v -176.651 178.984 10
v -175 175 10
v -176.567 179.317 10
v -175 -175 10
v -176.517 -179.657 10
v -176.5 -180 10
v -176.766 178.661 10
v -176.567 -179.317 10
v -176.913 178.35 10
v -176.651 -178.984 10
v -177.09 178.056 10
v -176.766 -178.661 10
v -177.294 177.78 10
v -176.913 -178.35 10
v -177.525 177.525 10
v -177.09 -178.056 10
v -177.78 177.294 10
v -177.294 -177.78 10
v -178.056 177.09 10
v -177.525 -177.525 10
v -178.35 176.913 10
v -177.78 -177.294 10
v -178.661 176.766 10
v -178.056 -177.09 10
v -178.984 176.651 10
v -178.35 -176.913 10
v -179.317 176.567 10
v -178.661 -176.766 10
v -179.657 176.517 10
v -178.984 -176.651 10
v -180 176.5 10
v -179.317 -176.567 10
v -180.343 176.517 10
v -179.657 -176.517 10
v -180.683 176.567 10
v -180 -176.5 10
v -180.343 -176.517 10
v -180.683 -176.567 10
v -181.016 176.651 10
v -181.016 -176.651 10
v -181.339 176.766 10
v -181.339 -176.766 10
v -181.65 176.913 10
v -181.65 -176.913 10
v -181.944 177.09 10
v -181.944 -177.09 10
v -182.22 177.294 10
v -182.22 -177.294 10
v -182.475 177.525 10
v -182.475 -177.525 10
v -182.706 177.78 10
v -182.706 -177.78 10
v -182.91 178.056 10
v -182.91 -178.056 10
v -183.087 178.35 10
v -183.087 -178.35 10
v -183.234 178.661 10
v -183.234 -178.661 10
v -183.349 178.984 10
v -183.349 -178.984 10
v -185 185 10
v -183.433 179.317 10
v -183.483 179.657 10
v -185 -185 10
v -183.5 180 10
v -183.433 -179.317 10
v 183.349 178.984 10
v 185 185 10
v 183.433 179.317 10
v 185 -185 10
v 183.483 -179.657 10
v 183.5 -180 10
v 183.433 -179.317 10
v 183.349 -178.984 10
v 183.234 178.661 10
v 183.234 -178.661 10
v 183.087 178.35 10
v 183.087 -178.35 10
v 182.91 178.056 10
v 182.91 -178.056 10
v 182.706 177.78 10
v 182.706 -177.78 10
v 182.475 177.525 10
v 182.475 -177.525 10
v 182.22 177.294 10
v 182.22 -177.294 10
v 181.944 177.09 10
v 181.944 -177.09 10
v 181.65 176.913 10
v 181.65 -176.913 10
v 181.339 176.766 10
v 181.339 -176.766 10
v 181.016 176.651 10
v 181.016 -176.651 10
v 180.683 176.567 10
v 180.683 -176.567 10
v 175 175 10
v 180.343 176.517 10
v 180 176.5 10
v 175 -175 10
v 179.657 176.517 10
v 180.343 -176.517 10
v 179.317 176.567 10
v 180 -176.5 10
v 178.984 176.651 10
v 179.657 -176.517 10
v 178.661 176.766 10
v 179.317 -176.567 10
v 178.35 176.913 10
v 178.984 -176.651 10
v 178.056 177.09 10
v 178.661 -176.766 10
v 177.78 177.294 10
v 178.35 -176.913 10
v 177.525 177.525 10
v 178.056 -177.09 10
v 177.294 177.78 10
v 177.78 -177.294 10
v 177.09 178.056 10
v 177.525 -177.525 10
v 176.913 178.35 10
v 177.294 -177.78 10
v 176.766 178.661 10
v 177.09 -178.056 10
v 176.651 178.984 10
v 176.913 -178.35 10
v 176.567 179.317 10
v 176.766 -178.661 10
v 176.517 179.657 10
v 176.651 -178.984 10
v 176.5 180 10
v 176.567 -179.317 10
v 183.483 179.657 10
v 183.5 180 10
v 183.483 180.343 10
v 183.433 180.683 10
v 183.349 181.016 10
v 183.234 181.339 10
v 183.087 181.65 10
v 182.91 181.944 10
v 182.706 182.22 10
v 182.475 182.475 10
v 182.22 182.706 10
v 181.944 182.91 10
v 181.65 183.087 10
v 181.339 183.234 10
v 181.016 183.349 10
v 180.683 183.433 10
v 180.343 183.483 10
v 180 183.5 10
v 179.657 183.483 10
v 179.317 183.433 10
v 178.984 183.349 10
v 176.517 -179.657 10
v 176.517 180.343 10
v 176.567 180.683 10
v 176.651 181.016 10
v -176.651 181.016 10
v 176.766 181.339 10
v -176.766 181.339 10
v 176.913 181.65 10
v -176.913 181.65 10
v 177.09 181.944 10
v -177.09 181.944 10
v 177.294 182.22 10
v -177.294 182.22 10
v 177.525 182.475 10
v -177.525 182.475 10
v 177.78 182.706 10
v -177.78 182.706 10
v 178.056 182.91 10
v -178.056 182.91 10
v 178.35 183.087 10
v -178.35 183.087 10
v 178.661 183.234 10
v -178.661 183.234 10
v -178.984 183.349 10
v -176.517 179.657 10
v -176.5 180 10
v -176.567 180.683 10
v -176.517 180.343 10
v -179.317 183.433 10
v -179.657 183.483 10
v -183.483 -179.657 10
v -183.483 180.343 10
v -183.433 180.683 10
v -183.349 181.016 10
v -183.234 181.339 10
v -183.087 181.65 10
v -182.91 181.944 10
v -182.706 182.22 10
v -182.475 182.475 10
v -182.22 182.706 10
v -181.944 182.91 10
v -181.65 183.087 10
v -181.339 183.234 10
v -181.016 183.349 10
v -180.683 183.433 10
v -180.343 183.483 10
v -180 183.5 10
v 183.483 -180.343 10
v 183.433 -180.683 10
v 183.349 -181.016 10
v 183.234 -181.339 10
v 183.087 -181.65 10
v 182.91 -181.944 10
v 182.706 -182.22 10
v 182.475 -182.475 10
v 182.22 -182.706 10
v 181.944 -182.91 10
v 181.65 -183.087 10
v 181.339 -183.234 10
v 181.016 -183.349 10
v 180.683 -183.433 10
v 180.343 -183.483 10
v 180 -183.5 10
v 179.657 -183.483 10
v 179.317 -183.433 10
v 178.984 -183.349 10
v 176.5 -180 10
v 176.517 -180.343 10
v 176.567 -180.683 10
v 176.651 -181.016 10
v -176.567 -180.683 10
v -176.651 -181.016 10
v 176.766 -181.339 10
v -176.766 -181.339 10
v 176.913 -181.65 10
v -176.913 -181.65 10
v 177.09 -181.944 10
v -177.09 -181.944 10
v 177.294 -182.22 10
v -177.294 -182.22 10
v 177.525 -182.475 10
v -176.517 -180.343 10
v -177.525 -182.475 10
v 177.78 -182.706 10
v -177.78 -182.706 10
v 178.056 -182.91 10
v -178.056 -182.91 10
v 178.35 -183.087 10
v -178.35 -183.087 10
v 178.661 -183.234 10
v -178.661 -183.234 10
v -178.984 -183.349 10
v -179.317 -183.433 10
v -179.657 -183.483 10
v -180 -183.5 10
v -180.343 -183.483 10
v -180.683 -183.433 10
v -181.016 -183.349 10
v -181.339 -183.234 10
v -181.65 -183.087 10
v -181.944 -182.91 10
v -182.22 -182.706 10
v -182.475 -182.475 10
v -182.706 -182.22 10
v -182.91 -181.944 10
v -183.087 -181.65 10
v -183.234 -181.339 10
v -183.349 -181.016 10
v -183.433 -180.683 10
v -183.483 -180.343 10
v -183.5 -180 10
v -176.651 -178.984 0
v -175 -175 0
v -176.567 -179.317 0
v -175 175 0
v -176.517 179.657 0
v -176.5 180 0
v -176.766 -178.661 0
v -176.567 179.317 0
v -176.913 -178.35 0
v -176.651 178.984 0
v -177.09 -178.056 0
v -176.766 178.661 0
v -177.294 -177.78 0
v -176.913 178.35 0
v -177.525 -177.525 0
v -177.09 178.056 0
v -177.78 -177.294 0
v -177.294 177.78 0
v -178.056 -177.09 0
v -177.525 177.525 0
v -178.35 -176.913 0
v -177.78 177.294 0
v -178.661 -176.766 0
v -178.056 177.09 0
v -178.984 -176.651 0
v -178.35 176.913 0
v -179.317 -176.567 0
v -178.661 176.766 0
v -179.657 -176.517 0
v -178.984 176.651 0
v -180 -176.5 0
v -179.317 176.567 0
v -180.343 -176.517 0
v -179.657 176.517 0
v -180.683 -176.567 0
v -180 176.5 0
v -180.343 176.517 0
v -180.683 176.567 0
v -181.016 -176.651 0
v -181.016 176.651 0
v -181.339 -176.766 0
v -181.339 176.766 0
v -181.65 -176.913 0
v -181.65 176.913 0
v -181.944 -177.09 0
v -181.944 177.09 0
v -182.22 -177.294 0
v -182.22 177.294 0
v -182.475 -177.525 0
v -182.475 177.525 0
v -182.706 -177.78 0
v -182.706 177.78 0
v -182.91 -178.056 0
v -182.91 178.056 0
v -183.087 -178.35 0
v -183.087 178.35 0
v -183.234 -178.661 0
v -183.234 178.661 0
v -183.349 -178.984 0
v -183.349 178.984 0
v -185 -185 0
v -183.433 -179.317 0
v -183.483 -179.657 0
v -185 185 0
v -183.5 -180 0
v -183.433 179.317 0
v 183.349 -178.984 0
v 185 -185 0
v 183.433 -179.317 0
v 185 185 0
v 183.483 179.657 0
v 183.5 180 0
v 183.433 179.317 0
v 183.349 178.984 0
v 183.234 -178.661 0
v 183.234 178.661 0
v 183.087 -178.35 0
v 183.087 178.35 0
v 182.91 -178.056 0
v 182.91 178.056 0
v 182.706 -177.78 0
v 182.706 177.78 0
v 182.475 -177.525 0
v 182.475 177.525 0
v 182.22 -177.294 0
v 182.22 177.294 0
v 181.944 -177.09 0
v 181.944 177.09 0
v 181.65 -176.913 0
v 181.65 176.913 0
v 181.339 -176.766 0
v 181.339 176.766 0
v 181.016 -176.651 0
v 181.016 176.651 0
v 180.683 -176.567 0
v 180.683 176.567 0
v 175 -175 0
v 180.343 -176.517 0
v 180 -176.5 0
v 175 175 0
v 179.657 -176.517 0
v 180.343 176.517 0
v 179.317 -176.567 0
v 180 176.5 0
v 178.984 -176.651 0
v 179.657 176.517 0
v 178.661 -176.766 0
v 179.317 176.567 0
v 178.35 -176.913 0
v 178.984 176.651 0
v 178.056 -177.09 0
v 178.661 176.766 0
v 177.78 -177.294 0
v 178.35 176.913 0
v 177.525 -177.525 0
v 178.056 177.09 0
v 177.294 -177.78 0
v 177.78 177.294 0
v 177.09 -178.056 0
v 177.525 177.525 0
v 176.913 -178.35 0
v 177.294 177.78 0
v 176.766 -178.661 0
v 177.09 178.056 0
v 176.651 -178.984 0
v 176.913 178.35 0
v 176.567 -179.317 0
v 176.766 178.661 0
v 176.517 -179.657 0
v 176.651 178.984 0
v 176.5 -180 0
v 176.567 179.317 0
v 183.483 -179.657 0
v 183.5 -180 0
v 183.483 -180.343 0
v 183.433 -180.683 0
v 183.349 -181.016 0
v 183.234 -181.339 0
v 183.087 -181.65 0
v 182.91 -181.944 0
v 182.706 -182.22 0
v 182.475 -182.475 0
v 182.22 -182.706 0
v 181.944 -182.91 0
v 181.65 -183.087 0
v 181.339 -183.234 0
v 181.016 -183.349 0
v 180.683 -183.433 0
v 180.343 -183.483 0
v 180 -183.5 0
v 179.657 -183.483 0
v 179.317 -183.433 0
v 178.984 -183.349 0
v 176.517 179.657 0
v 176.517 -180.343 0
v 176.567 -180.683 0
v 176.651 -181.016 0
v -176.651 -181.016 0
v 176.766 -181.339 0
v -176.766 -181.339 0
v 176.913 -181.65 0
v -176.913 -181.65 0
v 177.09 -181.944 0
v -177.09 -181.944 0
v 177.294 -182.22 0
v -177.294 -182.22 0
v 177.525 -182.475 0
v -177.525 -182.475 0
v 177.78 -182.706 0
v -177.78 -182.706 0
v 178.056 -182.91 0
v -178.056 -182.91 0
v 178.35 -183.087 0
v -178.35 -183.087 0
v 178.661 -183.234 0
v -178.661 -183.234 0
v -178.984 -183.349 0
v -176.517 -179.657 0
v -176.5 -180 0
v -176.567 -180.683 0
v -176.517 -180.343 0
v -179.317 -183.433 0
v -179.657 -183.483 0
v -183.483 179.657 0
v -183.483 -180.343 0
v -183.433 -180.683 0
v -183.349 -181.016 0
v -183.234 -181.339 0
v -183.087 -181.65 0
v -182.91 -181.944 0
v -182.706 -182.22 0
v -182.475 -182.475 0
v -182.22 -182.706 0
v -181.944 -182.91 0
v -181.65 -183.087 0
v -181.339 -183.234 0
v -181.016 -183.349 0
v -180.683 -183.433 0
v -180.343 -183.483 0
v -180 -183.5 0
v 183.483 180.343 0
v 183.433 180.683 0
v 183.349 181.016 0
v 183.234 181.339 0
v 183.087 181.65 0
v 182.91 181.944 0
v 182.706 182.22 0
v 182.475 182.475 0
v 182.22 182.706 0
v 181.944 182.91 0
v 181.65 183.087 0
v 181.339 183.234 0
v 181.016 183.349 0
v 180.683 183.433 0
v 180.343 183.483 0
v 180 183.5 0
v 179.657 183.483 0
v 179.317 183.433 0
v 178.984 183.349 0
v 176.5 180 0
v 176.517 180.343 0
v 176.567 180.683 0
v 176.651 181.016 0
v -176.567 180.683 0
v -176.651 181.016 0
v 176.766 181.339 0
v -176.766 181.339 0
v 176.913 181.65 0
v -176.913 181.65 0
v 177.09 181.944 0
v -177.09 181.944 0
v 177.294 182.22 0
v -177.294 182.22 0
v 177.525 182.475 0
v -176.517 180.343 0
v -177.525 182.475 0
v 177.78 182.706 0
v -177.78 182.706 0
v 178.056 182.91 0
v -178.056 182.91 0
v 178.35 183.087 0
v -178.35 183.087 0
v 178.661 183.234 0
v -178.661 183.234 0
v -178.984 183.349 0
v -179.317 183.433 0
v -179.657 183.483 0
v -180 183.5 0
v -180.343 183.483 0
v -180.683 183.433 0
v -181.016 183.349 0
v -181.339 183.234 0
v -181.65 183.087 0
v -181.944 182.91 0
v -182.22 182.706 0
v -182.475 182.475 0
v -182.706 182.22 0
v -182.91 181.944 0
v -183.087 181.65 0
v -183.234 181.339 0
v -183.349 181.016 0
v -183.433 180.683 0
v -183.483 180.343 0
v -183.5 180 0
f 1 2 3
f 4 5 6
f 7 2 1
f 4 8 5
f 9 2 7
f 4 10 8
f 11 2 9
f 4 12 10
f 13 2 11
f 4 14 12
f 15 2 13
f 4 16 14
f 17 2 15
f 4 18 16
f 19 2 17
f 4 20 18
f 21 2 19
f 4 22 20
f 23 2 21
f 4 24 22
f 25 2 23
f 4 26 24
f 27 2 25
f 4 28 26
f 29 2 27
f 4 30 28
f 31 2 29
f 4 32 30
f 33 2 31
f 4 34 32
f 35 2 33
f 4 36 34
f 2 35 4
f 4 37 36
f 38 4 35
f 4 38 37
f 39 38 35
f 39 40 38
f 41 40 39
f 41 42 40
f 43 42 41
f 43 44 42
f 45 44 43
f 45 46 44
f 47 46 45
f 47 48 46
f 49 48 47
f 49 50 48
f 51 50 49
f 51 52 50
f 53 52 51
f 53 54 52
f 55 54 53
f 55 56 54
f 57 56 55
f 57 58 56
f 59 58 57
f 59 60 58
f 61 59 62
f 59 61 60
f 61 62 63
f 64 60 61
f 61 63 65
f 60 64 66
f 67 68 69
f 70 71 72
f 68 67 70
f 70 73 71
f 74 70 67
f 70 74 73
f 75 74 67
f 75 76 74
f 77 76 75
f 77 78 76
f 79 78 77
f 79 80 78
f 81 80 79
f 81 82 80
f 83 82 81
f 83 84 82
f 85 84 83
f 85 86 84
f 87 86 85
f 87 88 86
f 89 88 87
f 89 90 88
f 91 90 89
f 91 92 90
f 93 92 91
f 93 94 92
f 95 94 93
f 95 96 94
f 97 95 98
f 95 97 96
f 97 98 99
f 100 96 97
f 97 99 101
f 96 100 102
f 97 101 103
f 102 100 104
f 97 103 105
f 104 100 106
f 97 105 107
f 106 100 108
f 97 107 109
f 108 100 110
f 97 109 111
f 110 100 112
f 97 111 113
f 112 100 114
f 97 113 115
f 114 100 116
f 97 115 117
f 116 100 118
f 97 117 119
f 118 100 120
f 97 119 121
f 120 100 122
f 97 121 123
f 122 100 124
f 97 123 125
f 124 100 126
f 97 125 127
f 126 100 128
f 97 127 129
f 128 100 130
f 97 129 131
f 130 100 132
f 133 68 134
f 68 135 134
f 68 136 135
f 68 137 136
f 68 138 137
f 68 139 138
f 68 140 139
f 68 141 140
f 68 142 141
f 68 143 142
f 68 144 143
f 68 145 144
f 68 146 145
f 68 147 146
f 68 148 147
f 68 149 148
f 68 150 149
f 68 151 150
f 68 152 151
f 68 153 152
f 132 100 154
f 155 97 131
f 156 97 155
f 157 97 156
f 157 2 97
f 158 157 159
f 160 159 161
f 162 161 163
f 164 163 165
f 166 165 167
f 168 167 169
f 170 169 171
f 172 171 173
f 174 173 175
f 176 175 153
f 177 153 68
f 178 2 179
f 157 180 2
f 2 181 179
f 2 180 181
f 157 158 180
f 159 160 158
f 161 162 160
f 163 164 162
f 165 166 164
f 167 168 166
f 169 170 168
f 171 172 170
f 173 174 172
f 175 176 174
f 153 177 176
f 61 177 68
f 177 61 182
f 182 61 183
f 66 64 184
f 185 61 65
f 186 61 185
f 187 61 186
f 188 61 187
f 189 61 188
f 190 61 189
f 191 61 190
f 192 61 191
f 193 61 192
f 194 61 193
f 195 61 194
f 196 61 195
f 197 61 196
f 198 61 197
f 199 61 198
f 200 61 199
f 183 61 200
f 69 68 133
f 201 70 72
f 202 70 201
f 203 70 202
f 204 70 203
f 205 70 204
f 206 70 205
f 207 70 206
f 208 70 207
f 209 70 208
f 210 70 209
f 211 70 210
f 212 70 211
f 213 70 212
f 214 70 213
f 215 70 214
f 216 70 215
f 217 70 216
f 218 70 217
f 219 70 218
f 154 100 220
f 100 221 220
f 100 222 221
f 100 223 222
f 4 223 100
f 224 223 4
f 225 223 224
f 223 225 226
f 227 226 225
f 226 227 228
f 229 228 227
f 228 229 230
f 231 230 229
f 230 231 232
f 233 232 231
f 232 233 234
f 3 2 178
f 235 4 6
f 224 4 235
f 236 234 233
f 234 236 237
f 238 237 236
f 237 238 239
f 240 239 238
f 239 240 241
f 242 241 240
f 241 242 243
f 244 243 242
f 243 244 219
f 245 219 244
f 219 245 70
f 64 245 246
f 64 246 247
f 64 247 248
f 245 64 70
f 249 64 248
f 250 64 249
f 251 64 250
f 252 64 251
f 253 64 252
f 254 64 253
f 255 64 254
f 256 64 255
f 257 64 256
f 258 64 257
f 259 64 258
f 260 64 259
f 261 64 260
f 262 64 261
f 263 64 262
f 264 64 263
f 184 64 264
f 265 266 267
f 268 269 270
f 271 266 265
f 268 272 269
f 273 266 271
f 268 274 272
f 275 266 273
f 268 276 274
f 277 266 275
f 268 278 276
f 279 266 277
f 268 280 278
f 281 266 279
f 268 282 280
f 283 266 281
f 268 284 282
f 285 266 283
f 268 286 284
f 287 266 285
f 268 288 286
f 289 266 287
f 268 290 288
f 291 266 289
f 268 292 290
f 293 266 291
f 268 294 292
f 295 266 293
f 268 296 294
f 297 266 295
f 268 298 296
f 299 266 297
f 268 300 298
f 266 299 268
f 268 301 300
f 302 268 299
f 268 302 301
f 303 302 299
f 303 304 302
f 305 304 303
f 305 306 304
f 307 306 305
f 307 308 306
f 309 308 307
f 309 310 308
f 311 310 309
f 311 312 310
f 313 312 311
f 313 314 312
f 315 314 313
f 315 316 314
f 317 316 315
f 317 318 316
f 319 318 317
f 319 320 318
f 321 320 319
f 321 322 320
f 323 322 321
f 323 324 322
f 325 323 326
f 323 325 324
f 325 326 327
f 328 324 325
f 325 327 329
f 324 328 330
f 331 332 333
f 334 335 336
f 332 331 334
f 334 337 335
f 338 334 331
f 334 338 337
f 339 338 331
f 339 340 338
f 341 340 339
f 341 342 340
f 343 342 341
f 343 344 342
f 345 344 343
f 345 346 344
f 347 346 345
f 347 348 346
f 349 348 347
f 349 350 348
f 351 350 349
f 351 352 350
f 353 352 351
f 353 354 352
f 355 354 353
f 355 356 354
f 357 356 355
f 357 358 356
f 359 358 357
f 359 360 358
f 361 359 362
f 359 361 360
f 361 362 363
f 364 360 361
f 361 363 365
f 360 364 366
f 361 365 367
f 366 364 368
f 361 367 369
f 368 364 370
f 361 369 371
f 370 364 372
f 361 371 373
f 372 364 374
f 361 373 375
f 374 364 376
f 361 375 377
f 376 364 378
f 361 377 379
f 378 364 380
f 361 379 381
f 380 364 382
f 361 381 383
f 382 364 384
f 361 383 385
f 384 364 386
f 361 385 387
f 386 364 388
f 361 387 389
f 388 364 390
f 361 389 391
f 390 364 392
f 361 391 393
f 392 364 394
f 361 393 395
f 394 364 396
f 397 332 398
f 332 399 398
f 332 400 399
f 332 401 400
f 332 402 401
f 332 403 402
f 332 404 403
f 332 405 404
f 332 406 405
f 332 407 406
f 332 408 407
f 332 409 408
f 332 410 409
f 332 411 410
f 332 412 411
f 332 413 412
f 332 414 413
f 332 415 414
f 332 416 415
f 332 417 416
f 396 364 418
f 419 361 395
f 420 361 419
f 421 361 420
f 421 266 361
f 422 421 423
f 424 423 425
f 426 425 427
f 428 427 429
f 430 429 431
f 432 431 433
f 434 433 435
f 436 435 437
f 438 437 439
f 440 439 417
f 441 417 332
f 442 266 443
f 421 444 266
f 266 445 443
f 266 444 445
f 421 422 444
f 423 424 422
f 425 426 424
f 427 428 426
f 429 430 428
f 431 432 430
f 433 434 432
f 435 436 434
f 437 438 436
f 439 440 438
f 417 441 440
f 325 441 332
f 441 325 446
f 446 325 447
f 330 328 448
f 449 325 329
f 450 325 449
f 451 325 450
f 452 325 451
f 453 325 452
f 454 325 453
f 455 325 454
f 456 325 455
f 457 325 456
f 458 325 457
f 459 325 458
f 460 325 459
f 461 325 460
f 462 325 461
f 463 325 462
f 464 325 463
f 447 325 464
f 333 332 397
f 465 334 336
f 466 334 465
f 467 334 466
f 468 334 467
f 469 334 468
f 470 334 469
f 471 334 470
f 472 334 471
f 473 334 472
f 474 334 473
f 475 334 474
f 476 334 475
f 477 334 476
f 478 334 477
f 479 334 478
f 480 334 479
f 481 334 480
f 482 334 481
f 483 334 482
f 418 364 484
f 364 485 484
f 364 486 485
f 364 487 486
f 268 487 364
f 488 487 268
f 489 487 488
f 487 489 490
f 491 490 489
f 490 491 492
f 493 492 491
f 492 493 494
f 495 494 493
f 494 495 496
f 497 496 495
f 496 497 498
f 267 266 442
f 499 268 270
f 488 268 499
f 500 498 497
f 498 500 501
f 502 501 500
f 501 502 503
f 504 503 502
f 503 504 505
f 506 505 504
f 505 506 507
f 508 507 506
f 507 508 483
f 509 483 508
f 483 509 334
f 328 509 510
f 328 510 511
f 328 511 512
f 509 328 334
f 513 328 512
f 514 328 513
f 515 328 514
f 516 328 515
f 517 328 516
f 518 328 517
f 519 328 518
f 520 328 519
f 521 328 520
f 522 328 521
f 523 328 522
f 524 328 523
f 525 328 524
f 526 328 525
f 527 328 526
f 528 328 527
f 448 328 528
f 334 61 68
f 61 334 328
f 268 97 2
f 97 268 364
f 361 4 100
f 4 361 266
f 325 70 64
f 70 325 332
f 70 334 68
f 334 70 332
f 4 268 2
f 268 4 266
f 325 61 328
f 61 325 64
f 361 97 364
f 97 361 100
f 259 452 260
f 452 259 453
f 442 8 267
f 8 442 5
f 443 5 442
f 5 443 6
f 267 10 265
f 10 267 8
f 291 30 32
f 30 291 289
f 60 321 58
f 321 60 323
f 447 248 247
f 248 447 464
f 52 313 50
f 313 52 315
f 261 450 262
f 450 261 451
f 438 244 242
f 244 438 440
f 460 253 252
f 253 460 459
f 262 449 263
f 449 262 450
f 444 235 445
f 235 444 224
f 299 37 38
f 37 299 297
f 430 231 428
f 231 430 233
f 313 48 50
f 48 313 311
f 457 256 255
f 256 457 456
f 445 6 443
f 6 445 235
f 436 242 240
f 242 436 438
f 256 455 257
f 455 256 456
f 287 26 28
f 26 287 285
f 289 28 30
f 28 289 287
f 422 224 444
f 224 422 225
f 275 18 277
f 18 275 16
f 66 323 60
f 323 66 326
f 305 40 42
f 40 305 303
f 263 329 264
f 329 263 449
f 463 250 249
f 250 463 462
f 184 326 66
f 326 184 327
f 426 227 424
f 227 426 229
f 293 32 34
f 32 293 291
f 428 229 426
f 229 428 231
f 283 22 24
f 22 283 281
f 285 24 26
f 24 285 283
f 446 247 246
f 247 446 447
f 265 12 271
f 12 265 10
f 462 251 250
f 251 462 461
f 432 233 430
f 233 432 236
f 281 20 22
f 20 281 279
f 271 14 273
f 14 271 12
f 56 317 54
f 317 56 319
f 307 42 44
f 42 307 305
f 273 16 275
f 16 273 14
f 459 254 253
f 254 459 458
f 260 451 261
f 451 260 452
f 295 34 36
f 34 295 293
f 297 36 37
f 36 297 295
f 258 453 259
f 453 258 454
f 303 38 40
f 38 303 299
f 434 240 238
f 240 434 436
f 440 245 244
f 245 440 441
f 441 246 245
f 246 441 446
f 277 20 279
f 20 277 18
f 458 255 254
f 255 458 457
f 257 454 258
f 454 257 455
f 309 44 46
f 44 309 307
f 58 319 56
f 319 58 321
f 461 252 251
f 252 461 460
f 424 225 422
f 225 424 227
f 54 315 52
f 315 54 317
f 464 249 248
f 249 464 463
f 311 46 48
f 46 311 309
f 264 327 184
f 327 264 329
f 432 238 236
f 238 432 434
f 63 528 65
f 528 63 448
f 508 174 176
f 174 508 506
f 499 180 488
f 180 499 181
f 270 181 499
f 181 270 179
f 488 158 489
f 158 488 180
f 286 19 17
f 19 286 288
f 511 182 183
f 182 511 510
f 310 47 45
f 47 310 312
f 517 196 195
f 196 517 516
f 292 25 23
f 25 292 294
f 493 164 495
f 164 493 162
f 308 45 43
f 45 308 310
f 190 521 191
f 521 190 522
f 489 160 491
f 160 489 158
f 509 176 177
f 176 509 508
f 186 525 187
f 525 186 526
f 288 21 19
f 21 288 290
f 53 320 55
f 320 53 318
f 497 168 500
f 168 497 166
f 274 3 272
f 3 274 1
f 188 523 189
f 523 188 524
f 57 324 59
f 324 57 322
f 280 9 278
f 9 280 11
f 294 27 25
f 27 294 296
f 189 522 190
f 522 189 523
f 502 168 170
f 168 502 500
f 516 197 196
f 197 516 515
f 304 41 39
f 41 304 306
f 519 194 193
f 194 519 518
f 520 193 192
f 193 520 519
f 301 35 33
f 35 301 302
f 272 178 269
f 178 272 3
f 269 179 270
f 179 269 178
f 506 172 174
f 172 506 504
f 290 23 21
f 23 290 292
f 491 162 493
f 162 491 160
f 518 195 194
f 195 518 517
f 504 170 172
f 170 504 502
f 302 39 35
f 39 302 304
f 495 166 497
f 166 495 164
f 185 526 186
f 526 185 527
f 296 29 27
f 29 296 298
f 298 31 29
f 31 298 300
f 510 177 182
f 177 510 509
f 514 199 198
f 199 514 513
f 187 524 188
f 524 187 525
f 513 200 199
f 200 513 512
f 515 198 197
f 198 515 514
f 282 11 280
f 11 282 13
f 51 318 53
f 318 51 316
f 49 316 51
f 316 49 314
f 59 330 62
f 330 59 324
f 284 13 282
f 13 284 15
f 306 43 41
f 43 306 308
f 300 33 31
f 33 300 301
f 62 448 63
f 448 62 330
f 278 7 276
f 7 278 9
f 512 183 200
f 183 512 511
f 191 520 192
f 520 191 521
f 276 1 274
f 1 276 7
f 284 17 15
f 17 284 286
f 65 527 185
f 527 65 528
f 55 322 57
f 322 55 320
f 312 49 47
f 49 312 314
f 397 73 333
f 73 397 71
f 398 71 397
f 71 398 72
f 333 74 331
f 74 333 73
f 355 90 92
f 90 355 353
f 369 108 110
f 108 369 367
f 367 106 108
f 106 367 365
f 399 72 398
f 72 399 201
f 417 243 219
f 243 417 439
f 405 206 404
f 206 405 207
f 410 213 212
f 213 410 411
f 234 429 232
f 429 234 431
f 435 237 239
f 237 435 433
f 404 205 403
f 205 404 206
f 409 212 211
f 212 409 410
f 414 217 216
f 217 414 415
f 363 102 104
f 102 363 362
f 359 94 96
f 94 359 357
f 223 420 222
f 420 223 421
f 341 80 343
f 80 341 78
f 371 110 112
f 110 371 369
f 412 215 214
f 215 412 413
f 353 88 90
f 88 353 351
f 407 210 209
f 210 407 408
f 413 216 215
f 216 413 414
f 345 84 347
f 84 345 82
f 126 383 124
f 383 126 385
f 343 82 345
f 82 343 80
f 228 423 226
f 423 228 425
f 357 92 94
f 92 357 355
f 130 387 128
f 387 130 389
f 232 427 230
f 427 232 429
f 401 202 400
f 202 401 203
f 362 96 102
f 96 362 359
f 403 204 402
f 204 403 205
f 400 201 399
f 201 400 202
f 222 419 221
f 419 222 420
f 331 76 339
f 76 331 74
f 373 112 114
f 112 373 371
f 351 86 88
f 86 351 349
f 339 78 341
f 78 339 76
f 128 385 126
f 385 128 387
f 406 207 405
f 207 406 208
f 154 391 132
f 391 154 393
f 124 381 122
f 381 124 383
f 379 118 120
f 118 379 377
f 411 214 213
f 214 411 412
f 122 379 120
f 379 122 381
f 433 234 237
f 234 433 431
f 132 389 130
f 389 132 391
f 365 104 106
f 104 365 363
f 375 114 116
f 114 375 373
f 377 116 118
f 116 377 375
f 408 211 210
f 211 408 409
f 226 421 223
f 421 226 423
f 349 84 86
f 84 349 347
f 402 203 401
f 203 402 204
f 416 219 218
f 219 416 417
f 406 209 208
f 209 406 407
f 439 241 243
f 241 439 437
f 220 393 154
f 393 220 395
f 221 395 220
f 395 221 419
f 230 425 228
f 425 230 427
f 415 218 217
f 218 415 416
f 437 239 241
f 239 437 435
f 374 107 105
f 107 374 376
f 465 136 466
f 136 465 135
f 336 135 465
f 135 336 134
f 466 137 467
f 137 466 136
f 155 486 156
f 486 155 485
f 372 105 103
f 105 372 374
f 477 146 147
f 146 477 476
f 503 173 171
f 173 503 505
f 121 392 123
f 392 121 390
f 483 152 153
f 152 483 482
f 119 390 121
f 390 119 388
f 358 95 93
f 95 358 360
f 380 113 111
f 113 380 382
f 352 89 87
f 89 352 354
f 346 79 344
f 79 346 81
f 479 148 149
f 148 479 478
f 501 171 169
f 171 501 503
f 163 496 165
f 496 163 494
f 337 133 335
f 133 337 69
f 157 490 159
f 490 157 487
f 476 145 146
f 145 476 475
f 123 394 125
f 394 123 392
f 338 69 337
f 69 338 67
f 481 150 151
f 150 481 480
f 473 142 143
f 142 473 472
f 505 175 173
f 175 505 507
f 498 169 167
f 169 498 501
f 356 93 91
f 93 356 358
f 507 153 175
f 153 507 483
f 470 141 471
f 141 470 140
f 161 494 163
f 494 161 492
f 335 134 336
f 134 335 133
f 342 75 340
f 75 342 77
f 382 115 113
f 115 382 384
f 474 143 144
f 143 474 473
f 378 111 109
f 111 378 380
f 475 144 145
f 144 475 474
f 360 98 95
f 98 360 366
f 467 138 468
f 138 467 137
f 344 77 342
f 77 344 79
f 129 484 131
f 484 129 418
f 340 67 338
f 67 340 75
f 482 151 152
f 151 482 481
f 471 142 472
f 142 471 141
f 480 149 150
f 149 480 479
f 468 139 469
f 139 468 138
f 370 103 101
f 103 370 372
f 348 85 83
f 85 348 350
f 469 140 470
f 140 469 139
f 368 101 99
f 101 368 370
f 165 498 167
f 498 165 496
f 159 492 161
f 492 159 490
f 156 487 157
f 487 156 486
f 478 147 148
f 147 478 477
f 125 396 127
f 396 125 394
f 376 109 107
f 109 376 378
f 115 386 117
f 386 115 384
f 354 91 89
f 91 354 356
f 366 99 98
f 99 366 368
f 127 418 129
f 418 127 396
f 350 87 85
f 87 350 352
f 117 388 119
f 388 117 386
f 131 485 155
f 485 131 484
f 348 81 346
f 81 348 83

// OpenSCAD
// ring_08.scad - ring index 8 (z bottom = 80 mm)
$fn = 64; bar = 10; half_b = bar/2; outer = 370; half_outer = outer/2;
front_y = 180; back_y = -180; left_x = -180; right_x = 180;
x_centers = [-170, -100, -30, 40, 110, 180];
z_centers = [5, 85, 155, 225, 295, 365, 435, 505, 575, 645, 715]; ring_z = 80;
module place_box(cx, cy, sx, sy) { translate([cx - sx/2, cy - sy/2, 0]) cube([sx, sy, bar]); }

difference() { union() {
    for (x = x_centers) { place_box(x, front_y, bar, bar); place_box(x, back_y, bar, bar); }
    for (y = x_centers) { place_box(left_x, y, bar, bar); place_box(right_x, y, bar, bar); }
    for (zc = z_centers) if ((zc - half_b < ring_z + bar) && (zc + half_b > ring_z)) {
        translate([-half_outer, front_y - half_b, 0]) cube([outer, bar, bar]);
        translate([-half_outer, back_y - half_b, 0])  cube([outer, bar, bar]);
        translate([left_x - half_b, -half_outer, 0])  cube([bar, outer, bar]);
        translate([right_x - half_b, -half_outer, 0]) cube([bar, outer, bar]);
    }
  }
  for (cx = [-180, 180]) for (cy = [-180, 180]) translate([cx, cy, 0]) cylinder(h = bar, r = 3.5, $fn = 64);
}
